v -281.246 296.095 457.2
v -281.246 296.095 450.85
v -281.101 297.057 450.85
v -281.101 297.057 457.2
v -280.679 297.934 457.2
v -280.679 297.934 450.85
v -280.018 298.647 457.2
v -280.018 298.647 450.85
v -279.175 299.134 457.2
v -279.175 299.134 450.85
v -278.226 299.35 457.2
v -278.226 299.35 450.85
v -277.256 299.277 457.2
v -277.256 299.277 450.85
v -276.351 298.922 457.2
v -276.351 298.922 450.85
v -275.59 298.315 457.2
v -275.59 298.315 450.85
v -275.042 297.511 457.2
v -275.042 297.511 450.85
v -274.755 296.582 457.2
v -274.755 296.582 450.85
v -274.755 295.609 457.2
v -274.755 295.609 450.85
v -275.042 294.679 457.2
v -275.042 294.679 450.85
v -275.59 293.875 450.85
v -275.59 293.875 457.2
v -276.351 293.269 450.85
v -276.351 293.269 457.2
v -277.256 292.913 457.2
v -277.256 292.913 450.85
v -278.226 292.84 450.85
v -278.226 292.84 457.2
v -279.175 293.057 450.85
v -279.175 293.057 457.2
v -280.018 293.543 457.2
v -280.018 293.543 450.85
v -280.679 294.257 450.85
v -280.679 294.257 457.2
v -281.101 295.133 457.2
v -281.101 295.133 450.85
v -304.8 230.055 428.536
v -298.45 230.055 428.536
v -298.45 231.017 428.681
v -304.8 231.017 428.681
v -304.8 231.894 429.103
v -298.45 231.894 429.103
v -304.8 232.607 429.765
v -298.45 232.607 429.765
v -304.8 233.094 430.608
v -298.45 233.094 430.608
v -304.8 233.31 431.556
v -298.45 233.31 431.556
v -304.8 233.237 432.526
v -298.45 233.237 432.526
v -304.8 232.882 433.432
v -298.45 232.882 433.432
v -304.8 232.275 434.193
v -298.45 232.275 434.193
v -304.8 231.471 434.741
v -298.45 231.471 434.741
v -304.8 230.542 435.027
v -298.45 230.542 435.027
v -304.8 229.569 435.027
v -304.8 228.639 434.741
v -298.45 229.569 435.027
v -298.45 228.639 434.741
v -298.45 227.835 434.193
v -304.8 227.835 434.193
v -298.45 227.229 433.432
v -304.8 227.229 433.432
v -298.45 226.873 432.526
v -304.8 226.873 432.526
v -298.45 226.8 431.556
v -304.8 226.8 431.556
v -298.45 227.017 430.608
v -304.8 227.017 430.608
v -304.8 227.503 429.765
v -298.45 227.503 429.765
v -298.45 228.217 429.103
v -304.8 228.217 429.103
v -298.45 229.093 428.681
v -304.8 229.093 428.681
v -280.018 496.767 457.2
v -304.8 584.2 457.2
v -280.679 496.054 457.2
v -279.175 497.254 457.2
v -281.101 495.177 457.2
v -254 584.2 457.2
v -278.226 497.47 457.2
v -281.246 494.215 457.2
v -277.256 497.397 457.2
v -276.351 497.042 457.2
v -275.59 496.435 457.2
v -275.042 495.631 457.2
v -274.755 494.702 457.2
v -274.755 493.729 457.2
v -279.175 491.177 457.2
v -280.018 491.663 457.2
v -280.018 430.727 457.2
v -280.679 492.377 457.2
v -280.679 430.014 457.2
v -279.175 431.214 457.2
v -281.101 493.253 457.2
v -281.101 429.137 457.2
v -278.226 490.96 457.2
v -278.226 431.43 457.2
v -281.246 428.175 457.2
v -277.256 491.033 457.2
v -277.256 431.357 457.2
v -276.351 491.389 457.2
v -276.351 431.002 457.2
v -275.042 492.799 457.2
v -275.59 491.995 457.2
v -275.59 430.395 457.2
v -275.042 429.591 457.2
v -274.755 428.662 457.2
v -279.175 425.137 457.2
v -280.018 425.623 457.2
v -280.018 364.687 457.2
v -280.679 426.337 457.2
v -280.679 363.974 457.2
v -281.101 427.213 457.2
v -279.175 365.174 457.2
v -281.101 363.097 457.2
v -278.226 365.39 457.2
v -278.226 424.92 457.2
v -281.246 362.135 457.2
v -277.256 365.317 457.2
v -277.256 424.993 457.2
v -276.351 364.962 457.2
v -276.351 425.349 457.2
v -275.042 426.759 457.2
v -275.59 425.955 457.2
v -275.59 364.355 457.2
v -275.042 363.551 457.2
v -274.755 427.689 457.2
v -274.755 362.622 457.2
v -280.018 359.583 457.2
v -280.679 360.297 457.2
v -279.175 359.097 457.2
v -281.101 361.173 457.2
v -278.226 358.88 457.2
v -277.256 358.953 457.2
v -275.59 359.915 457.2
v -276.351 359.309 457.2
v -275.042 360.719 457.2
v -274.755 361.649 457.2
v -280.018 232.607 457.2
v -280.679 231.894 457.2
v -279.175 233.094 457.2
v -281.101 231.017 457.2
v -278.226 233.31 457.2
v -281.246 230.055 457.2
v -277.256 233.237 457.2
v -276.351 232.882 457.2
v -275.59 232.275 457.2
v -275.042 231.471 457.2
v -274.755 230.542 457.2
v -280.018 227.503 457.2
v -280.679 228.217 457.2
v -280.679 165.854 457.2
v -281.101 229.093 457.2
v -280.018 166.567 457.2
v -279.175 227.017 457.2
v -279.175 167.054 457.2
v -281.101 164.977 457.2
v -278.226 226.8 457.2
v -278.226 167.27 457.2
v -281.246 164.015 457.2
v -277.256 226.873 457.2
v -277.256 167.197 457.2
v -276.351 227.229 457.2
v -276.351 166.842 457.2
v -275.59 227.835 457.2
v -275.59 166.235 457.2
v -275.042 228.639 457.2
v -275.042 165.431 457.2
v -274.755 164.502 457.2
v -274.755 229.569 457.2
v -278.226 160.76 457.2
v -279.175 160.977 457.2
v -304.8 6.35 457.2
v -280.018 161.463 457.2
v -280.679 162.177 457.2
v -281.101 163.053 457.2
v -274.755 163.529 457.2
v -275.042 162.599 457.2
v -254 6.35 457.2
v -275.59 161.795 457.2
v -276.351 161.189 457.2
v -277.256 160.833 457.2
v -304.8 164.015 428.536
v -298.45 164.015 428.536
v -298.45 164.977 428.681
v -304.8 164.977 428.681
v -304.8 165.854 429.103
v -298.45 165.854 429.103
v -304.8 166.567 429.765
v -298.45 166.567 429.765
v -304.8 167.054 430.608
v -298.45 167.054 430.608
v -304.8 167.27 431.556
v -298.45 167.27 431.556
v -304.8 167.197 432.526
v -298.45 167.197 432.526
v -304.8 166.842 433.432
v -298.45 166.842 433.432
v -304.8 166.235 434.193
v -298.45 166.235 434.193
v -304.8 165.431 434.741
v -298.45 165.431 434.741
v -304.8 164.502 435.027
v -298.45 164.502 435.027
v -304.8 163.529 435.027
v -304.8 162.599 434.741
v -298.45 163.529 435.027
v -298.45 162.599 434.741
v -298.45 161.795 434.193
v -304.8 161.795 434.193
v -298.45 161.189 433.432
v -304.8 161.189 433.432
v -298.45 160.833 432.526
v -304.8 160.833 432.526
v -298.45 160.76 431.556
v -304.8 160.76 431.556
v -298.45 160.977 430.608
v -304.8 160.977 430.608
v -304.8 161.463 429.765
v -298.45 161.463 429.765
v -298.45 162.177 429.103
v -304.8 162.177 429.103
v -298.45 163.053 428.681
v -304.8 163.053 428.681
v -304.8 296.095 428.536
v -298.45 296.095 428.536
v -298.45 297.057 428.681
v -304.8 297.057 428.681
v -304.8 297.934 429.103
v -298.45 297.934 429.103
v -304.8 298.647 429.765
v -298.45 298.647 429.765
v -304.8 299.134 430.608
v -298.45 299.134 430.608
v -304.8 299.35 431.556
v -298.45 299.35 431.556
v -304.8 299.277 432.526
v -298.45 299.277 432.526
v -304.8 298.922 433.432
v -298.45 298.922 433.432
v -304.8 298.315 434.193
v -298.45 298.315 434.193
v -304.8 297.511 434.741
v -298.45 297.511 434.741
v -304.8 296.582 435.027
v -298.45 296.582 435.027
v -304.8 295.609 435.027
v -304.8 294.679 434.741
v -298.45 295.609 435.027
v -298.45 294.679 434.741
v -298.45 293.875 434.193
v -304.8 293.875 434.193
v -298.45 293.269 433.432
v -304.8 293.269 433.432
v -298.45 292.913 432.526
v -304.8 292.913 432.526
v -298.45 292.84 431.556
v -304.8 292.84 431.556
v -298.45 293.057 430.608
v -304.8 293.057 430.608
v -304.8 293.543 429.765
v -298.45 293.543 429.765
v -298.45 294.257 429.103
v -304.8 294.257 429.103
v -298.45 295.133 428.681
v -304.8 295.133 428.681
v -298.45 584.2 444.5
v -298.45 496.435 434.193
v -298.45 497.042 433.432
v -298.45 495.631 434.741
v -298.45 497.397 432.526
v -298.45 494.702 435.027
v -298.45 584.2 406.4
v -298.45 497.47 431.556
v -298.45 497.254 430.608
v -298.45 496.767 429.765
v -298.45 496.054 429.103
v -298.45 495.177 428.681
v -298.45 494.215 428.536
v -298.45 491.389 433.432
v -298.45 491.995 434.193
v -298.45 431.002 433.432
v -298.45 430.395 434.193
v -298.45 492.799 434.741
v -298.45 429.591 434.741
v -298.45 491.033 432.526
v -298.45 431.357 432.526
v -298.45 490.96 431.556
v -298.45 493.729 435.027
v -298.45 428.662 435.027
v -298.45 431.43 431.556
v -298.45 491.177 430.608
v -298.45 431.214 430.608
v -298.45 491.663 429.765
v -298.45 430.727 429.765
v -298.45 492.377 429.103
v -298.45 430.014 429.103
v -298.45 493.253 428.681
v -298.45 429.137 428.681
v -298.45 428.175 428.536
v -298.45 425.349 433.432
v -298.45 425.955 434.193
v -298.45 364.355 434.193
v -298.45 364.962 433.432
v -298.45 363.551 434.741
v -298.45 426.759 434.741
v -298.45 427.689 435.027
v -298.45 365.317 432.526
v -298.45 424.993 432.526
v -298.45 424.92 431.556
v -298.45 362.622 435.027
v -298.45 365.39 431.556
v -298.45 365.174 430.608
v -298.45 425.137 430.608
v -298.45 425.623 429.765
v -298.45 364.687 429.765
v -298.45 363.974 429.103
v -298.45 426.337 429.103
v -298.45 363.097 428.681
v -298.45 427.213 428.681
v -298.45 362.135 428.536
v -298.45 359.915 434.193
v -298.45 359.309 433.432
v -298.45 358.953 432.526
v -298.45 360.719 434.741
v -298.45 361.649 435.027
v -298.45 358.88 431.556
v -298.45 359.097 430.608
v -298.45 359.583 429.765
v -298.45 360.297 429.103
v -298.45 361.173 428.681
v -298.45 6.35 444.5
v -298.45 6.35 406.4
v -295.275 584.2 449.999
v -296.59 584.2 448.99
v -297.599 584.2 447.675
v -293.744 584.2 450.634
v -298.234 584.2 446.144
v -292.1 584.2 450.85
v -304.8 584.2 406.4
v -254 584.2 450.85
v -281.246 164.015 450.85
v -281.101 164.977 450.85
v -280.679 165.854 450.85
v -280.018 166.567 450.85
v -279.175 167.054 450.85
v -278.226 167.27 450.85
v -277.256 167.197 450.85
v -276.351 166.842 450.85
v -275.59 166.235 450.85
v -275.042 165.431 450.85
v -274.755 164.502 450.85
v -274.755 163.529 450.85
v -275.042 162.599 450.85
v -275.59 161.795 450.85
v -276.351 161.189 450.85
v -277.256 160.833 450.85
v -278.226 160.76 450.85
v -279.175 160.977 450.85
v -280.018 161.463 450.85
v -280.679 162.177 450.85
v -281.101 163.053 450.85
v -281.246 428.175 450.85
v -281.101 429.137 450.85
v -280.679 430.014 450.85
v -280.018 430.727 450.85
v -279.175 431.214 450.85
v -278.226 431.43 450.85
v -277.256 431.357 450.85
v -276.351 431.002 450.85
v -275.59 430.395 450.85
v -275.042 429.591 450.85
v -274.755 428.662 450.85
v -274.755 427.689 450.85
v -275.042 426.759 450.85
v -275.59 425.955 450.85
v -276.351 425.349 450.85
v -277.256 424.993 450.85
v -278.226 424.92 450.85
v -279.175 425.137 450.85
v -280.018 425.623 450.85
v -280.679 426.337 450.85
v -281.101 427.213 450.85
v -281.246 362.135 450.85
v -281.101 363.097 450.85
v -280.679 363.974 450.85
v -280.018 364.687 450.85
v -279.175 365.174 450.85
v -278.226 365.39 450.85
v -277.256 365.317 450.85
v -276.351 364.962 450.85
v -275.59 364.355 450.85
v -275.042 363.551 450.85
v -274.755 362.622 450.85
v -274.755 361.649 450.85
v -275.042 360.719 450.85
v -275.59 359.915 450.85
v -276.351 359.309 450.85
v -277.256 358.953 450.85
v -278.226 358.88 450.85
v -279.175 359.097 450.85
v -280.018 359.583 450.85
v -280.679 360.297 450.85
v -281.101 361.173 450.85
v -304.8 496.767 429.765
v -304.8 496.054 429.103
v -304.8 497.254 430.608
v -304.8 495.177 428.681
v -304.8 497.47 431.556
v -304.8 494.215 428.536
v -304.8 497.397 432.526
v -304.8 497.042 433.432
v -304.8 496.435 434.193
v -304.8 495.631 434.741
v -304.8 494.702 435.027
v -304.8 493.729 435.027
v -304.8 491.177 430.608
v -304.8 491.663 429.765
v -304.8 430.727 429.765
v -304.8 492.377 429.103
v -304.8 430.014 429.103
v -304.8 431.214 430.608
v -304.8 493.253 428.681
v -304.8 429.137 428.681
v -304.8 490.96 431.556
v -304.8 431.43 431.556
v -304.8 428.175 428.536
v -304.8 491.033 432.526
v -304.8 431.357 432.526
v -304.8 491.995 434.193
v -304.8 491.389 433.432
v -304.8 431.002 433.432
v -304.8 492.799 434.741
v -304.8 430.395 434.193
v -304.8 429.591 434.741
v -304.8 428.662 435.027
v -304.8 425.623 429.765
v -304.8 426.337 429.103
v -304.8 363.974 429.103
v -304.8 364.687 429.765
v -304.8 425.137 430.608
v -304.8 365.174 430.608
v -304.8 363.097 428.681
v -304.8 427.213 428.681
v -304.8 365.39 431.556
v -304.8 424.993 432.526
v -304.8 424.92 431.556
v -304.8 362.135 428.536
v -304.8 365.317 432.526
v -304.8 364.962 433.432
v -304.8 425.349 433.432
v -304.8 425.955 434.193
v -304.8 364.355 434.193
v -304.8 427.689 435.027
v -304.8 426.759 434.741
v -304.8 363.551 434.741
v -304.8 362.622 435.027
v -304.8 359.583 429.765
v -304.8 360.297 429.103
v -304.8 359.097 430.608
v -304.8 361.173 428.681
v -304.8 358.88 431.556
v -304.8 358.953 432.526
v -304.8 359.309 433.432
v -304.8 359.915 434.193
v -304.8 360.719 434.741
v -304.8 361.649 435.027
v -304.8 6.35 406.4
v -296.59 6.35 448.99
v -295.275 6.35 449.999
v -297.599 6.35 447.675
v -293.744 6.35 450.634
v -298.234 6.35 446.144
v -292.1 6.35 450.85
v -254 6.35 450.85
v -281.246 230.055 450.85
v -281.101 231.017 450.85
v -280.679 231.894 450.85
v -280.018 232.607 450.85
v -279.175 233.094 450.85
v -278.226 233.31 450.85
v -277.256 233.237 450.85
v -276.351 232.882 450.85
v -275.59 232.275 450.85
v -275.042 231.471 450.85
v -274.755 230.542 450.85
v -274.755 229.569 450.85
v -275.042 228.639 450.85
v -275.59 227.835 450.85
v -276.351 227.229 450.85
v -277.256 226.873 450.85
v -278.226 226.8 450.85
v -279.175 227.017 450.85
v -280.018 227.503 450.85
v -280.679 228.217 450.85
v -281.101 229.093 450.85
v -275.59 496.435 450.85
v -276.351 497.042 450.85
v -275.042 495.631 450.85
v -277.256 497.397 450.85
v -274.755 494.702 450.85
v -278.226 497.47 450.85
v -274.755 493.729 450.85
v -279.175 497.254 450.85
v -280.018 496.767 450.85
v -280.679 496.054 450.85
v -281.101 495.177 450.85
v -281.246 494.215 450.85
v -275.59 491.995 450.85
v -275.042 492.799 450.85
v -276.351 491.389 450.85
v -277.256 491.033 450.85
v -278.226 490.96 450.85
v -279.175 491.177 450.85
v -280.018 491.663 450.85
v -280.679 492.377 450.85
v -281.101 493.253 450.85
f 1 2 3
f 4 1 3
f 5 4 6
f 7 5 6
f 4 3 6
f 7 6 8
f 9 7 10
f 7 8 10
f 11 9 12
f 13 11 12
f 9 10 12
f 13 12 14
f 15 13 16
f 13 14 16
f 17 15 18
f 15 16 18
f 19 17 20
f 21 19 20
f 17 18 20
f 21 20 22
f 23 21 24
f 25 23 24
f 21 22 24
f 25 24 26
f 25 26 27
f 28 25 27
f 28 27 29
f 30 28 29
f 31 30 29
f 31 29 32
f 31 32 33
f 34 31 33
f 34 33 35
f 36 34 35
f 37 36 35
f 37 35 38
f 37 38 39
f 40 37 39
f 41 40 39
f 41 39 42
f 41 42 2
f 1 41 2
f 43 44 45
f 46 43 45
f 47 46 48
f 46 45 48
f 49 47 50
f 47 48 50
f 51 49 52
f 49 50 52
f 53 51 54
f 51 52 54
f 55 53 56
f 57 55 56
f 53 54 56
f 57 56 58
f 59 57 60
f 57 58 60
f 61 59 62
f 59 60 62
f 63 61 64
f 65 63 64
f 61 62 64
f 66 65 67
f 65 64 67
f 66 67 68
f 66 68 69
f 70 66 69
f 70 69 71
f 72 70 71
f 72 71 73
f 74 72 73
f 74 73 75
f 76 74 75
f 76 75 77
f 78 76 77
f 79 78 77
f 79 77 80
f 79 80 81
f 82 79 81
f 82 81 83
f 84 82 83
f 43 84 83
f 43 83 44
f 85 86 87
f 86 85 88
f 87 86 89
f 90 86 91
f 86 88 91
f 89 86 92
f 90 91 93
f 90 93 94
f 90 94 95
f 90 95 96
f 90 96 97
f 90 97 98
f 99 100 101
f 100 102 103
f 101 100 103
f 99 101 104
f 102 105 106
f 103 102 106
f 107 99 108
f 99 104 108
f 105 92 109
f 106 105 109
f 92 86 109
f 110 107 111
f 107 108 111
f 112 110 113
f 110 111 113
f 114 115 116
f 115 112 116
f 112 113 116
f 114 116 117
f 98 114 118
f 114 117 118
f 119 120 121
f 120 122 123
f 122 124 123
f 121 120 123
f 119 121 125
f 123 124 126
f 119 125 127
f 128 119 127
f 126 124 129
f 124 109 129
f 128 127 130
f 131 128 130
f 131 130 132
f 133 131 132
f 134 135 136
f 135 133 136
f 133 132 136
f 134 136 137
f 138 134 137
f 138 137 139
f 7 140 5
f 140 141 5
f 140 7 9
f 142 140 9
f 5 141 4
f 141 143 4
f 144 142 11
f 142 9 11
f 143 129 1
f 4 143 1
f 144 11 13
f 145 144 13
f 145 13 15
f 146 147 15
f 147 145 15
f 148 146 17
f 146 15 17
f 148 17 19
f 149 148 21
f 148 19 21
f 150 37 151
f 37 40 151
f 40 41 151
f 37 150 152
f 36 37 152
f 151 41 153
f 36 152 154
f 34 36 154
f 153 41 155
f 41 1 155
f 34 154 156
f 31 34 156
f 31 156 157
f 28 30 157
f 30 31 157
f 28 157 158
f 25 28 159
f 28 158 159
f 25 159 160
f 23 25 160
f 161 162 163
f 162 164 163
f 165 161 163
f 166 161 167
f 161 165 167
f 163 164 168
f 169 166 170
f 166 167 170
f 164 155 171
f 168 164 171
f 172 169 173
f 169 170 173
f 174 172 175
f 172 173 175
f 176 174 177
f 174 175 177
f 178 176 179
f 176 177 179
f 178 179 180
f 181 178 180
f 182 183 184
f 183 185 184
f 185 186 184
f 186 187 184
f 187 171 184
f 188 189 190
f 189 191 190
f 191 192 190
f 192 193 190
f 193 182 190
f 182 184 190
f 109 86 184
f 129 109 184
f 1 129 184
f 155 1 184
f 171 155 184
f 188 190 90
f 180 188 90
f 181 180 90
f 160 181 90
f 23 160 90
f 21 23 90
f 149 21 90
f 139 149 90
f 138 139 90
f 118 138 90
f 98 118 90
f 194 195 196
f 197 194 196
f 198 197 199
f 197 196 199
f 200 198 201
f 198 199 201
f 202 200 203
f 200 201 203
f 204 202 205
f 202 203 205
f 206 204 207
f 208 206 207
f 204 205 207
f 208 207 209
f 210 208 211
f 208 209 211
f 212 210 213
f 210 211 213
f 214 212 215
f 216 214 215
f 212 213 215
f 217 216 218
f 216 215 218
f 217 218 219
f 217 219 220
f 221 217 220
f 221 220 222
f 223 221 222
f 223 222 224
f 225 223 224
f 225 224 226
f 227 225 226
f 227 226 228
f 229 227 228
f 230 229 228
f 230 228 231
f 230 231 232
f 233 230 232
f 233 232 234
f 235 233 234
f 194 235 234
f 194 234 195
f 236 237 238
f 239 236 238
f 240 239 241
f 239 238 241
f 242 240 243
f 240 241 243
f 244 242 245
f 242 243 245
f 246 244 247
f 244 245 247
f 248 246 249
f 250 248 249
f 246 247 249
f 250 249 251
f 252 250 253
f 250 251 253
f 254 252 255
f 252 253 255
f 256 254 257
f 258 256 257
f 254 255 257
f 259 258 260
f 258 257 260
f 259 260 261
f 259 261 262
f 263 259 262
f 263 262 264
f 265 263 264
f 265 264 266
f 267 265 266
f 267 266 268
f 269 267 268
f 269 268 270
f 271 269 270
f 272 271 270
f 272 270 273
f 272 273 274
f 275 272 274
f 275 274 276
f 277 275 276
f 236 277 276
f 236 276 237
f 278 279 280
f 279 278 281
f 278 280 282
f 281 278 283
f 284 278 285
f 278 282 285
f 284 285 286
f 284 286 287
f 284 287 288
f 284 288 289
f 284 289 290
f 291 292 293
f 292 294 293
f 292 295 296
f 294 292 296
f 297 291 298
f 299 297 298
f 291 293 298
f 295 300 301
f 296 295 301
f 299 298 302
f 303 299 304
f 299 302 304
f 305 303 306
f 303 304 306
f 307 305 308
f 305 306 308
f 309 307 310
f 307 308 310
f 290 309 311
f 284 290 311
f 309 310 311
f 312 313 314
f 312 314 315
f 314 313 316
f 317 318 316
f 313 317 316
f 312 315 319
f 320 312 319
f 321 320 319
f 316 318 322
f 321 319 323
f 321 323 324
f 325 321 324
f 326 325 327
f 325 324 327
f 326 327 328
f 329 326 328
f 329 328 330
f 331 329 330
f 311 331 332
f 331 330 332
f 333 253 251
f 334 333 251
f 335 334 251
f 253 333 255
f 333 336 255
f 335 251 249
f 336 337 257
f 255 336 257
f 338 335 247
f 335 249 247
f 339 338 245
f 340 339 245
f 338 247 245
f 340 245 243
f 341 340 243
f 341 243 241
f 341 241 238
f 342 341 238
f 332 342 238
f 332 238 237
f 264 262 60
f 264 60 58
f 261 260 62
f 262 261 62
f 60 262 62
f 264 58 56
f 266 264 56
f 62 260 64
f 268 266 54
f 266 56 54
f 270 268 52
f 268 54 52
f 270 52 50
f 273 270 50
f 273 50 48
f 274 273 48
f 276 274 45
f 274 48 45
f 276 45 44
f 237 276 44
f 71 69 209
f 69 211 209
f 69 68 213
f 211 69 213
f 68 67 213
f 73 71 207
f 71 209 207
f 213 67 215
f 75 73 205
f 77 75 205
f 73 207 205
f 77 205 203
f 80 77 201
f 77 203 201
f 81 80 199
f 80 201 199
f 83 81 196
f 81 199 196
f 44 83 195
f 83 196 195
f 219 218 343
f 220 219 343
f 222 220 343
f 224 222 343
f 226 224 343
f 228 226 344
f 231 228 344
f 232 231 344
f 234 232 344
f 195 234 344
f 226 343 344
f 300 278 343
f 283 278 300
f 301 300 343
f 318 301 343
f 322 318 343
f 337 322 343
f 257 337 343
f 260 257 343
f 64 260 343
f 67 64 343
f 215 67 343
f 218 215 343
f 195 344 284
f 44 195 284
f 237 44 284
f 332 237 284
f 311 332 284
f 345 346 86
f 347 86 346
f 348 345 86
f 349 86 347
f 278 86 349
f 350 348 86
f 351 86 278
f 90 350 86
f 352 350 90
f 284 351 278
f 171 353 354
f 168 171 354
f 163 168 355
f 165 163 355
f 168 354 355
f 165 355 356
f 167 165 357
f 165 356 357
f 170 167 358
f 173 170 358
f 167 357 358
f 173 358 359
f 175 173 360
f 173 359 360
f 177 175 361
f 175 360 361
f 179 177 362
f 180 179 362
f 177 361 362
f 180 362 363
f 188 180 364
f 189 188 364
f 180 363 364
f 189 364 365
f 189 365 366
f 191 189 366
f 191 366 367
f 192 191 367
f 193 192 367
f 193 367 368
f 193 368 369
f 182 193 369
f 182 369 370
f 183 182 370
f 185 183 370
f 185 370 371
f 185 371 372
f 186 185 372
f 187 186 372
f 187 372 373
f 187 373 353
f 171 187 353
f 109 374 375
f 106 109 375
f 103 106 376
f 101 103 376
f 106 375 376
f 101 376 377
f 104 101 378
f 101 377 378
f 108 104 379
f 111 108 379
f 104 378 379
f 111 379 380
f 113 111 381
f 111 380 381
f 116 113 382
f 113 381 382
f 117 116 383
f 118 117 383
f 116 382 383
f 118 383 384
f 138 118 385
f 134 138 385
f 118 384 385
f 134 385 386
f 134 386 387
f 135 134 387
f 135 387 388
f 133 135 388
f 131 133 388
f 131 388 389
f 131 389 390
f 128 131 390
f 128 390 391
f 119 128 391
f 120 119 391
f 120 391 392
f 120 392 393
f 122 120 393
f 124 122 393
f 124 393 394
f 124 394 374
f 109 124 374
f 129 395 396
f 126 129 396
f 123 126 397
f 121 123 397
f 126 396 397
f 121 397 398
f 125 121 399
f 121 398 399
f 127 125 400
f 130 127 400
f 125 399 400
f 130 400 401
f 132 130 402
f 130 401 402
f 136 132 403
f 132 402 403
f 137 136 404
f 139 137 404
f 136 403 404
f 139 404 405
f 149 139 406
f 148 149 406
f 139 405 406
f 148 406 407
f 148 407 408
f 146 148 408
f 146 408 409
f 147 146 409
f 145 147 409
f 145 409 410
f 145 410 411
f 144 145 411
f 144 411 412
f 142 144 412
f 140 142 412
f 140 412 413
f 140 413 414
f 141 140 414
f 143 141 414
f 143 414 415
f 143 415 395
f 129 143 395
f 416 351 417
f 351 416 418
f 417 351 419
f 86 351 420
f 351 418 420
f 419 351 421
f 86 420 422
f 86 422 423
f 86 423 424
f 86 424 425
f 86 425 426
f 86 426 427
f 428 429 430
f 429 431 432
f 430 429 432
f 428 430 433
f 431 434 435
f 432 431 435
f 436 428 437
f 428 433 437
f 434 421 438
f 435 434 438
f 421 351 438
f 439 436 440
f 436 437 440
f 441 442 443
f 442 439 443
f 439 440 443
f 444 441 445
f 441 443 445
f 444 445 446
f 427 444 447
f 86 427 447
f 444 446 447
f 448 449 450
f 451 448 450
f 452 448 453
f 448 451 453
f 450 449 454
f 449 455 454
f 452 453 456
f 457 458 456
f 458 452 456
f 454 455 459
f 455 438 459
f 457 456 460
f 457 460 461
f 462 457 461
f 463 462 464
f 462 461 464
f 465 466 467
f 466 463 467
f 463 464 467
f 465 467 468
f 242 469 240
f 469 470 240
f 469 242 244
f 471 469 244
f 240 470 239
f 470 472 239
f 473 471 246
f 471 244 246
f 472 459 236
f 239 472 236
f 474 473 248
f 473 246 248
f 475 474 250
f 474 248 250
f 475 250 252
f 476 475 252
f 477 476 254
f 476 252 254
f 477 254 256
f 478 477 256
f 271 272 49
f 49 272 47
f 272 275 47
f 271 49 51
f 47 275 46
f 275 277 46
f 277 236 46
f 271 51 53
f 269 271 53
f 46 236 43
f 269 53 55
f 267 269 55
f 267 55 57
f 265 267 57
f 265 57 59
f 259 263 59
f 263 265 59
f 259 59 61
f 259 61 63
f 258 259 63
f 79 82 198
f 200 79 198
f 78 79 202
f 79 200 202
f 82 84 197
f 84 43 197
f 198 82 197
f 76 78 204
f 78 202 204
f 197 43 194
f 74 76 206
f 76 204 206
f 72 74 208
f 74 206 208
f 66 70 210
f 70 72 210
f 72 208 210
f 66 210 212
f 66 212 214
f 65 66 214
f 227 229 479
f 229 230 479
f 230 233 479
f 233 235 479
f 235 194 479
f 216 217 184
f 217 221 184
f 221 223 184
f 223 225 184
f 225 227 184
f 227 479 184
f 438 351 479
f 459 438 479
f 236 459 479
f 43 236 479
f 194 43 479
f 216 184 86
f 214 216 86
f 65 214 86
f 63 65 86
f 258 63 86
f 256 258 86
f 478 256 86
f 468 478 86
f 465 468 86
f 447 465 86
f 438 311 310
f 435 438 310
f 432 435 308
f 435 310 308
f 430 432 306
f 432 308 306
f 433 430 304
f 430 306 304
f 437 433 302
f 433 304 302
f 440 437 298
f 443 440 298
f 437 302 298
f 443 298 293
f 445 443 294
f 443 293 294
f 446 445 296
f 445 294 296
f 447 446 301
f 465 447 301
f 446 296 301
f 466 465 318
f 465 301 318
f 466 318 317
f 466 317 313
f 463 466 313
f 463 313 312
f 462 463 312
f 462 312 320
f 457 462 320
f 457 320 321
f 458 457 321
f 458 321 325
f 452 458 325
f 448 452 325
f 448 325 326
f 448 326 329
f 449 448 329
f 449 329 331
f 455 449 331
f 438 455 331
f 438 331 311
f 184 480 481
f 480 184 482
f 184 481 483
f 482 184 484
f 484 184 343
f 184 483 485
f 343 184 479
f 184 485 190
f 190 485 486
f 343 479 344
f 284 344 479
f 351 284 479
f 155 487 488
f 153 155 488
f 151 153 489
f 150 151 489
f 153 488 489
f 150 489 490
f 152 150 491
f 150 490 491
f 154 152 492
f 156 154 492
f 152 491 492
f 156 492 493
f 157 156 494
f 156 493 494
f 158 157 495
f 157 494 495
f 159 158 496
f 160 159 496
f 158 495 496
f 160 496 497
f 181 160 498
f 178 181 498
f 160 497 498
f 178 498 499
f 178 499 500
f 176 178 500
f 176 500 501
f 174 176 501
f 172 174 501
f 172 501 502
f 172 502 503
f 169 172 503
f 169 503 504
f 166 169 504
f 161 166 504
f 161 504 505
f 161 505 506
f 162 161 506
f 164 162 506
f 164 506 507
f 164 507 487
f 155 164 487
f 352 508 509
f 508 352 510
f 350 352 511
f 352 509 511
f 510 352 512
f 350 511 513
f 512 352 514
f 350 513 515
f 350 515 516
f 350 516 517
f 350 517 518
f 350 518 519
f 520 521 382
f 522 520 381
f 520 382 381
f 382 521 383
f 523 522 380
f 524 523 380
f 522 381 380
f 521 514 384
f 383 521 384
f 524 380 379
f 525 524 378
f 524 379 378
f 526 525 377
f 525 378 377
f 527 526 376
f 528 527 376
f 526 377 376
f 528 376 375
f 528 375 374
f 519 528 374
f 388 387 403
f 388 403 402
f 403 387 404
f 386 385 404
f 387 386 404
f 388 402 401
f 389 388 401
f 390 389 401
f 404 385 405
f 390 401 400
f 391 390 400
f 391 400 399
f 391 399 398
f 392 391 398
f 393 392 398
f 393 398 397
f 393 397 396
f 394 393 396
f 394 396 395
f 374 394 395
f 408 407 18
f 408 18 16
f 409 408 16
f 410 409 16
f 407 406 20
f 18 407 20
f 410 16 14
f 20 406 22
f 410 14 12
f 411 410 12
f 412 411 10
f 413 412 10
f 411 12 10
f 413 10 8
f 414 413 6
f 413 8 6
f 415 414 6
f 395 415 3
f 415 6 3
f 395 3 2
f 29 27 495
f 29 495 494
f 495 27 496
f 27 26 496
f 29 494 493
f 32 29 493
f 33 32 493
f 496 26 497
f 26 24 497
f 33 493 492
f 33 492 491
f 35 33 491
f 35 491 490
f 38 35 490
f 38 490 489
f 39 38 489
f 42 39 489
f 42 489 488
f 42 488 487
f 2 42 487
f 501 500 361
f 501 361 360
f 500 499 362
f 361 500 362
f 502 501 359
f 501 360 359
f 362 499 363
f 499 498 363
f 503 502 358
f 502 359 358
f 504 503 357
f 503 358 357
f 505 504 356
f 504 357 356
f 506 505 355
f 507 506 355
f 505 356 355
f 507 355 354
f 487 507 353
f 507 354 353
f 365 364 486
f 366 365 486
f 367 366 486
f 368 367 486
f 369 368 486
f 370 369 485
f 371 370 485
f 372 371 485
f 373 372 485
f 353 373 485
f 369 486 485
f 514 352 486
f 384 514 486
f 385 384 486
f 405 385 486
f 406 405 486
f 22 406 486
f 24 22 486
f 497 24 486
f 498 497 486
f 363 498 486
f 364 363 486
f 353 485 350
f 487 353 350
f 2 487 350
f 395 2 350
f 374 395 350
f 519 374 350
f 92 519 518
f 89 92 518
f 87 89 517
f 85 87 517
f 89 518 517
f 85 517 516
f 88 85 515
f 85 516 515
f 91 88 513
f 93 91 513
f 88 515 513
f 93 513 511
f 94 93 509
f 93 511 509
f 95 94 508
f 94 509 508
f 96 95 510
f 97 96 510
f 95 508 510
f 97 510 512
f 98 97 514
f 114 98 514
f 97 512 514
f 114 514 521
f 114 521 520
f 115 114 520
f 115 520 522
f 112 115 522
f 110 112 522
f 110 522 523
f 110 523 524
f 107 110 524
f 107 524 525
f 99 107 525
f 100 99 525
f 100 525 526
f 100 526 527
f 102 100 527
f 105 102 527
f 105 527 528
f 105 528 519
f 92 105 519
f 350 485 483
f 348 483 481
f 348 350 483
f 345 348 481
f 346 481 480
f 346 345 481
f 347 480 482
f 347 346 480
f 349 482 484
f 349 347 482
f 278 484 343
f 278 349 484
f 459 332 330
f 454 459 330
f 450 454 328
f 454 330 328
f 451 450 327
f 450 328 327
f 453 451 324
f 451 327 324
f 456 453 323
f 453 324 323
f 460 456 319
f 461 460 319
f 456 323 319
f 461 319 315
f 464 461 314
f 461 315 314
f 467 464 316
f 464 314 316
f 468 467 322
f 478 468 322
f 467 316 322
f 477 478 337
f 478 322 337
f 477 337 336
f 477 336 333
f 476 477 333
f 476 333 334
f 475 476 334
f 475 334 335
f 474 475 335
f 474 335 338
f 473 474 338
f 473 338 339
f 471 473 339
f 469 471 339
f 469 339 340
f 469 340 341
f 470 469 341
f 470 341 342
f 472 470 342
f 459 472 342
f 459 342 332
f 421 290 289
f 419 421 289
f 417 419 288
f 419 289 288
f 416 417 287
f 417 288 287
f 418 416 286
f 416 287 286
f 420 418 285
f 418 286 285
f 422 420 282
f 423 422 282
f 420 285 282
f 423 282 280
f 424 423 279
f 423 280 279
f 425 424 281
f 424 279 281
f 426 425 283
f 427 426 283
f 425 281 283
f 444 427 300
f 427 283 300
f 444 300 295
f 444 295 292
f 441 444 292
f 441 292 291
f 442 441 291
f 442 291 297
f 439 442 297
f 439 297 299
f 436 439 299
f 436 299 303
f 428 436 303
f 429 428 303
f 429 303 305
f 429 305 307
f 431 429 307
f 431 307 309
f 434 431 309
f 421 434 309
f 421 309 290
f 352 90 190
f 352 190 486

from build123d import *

# Parameters (mm, degrees)
BOSS_EXTRUDE1_DEPTH      = 577.85
FILLET1_R                = 6.35
F_0_257_DIAMETER_HOLE1_D = 6.5278
LPATTERN1_COUNT          = 6
LPATTERN1_PITCH          = 66.04
F_0_257_DIAMETER_HOLE2_D = 6.5278
LPATTERN2_COUNT          = 6
LPATTERN2_PITCH          = 66.04


with BuildPart() as part:
    # Sketch2 → Boss-Extrude1 (new body)
    with BuildSketch(Plane(origin=(0, 6.35, 0), x_dir=(1, 0, 0), z_dir=(0, 1, 0))):
        Polygon((-304.8, -406.4), (-304.8, -457.2), (-254, -457.2), (-254, -450.85), (-298.45, -450.85), (-298.45, -406.4), align=None)
    extrude(amount=BOSS_EXTRUDE1_DEPTH)

    # Fillet1
    fillet1_edges = [part.edges().sort_by_distance(p)[0] for p in [
        (-298.45, 295.275, 450.85),
    ]]
    fillet(fillet1_edges, radius=FILLET1_R)

    # F (0.257) Diameter Hole1 (through all)
    with Locations(Plane.XY.offset(457.2)):
        with Locations((-535.515028223, 347.01452534), (-277.982504407, 164.015269696)):
            f_0_257_diameter_hole1 = Hole(F_0_257_DIAMETER_HOLE1_D / 2)

    # LPattern1: F (0.257) Diameter Hole1 ×6
    with Locations(*[(0, i * LPATTERN1_PITCH, 0) for i in range(1, LPATTERN1_COUNT)]):
        add(f_0_257_diameter_hole1, mode=Mode.SUBTRACT)

    # F (0.257) Diameter Hole2 (through all)
    with Locations(Plane.ZY.offset(304.8)):
        with Locations((431.8, 164.015269696)):
            f_0_257_diameter_hole2 = Hole(F_0_257_DIAMETER_HOLE2_D / 2)

    # LPattern2: F (0.257) Diameter Hole2 ×6
    with Locations(*[(0, i * LPATTERN2_PITCH, 0) for i in range(1, LPATTERN2_COUNT)]):
        add(f_0_257_diameter_hole2, mode=Mode.SUBTRACT)


solid = part.part
